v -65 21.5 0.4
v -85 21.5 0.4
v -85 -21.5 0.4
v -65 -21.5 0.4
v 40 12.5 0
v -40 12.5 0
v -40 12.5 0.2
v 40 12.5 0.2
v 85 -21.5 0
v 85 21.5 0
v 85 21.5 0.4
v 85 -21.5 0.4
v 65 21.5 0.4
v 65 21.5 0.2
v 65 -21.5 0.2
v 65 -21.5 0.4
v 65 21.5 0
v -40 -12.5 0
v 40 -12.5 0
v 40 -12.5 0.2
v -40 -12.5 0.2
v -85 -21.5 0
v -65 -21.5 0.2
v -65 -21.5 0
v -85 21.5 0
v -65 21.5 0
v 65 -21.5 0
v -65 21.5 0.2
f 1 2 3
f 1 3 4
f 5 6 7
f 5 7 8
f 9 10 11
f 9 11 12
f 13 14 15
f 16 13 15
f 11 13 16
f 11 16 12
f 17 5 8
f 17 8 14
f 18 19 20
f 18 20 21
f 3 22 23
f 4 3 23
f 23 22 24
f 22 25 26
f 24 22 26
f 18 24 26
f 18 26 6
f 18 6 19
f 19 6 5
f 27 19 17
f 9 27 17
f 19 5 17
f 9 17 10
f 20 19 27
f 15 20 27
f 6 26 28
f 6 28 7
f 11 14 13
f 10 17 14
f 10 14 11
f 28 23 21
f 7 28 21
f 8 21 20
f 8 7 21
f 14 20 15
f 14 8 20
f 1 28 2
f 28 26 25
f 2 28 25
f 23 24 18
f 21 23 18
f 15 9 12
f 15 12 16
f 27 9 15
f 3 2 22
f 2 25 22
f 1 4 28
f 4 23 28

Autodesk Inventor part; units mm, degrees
ref_plane "YZ Plane" through (0, 0, 0) normal (1, 0, 0) x (0, 1, 0)
ref_plane "XZ Plane" through (0, 0, 0) normal (0, 1, 0) x (-1, 0, 0)
ref_plane "XY Plane" through (0, 0, 0) normal (0, 0, 1) x (1, 0, 0)
sketch "Sketch1" plane through (0, 0, 0) normal (0, 0, 1) x (1, 0, 0)
  line L0 (-65, 12.5) -> (65, 12.5)
  line L1 (65, 12.5) -> (65, -12.5)
  line L2 (65, -12.5) -> (-65, -12.5)
  line L3 (-65, -12.5) -> (-65, 12.5)
  line L4 (-65, 12.5) -> (-65, 21.5)
  line L5 (-65, -12.5) -> (-65, -21.5)
  line L6 (65, 12.5) -> (65, 21.5)
  line L7 (65, -12.5) -> (65, -21.5)
  line L8 (-65, 21.5) -> (-40, 12.5)
  line L9 (-65, -21.5) -> (-40, -12.5)
  line L10 (40, -12.5) -> (65, -21.5)
  line L11 (40, 12.5) -> (65, 21.5)
  line L12 (65, -10.7019) -> (65, -12.5)
  line L13 (-40, 30.8502) -> (-40, -39.2706) construction
  line L14 (40, 30.8502) -> (40, -39.2706) construction
  line L15 (-122.9274, 0) -> (95.3205, 0) construction
  line L16 (0, 69.381) -> (0, -63.5203) construction
  line L17 (-65, 21.5) -> (-85, 21.5)
  line L18 (-85, 21.5) -> (-85, -21.5)
  line L19 (-85, -21.5) -> (-65, -21.5)
  line L20 (-65, -21.5) -> (-65, 21.5)
  line L21 (65, 21.5) -> (85, 21.5)
  line L22 (85, 21.5) -> (85, -21.5)
  line L23 (85, -21.5) -> (65, -21.5)
  line L24 (65, -21.5) -> (65, 21.5)
  line L25 (-65, 21.5) -> (-65, -21.5)
  point P0 (0, 0)
  point P1 (0, 0)
  point P2 (-65, 0)
  point P3 (0, 12.5)
  dimension "d0" = 130
  dimension "d1" = 25
  dimension "d2" = 40
  dimension "d3" = 40
  dimension "d4" = 20
  dimension "d5" = 20
  dimension "d15" = 43
extrude "Extrusion1" add sketch "Sketch1" along normal blind 0.2
extrude "Extrusion3" add sketch "Sketch1" along normal blind 0.4 contours L3 L5 L19 L18 L17 L4
mirror "Mirror2" about plane through (0, 0, 0) normal (1, 0, 0) of "Extrusion3"
equation "\"d11\" = material"
equation "\"d16\" = 2 * material"
equation "\"material\" = 0.2"
properties part number "BandMiddle"
